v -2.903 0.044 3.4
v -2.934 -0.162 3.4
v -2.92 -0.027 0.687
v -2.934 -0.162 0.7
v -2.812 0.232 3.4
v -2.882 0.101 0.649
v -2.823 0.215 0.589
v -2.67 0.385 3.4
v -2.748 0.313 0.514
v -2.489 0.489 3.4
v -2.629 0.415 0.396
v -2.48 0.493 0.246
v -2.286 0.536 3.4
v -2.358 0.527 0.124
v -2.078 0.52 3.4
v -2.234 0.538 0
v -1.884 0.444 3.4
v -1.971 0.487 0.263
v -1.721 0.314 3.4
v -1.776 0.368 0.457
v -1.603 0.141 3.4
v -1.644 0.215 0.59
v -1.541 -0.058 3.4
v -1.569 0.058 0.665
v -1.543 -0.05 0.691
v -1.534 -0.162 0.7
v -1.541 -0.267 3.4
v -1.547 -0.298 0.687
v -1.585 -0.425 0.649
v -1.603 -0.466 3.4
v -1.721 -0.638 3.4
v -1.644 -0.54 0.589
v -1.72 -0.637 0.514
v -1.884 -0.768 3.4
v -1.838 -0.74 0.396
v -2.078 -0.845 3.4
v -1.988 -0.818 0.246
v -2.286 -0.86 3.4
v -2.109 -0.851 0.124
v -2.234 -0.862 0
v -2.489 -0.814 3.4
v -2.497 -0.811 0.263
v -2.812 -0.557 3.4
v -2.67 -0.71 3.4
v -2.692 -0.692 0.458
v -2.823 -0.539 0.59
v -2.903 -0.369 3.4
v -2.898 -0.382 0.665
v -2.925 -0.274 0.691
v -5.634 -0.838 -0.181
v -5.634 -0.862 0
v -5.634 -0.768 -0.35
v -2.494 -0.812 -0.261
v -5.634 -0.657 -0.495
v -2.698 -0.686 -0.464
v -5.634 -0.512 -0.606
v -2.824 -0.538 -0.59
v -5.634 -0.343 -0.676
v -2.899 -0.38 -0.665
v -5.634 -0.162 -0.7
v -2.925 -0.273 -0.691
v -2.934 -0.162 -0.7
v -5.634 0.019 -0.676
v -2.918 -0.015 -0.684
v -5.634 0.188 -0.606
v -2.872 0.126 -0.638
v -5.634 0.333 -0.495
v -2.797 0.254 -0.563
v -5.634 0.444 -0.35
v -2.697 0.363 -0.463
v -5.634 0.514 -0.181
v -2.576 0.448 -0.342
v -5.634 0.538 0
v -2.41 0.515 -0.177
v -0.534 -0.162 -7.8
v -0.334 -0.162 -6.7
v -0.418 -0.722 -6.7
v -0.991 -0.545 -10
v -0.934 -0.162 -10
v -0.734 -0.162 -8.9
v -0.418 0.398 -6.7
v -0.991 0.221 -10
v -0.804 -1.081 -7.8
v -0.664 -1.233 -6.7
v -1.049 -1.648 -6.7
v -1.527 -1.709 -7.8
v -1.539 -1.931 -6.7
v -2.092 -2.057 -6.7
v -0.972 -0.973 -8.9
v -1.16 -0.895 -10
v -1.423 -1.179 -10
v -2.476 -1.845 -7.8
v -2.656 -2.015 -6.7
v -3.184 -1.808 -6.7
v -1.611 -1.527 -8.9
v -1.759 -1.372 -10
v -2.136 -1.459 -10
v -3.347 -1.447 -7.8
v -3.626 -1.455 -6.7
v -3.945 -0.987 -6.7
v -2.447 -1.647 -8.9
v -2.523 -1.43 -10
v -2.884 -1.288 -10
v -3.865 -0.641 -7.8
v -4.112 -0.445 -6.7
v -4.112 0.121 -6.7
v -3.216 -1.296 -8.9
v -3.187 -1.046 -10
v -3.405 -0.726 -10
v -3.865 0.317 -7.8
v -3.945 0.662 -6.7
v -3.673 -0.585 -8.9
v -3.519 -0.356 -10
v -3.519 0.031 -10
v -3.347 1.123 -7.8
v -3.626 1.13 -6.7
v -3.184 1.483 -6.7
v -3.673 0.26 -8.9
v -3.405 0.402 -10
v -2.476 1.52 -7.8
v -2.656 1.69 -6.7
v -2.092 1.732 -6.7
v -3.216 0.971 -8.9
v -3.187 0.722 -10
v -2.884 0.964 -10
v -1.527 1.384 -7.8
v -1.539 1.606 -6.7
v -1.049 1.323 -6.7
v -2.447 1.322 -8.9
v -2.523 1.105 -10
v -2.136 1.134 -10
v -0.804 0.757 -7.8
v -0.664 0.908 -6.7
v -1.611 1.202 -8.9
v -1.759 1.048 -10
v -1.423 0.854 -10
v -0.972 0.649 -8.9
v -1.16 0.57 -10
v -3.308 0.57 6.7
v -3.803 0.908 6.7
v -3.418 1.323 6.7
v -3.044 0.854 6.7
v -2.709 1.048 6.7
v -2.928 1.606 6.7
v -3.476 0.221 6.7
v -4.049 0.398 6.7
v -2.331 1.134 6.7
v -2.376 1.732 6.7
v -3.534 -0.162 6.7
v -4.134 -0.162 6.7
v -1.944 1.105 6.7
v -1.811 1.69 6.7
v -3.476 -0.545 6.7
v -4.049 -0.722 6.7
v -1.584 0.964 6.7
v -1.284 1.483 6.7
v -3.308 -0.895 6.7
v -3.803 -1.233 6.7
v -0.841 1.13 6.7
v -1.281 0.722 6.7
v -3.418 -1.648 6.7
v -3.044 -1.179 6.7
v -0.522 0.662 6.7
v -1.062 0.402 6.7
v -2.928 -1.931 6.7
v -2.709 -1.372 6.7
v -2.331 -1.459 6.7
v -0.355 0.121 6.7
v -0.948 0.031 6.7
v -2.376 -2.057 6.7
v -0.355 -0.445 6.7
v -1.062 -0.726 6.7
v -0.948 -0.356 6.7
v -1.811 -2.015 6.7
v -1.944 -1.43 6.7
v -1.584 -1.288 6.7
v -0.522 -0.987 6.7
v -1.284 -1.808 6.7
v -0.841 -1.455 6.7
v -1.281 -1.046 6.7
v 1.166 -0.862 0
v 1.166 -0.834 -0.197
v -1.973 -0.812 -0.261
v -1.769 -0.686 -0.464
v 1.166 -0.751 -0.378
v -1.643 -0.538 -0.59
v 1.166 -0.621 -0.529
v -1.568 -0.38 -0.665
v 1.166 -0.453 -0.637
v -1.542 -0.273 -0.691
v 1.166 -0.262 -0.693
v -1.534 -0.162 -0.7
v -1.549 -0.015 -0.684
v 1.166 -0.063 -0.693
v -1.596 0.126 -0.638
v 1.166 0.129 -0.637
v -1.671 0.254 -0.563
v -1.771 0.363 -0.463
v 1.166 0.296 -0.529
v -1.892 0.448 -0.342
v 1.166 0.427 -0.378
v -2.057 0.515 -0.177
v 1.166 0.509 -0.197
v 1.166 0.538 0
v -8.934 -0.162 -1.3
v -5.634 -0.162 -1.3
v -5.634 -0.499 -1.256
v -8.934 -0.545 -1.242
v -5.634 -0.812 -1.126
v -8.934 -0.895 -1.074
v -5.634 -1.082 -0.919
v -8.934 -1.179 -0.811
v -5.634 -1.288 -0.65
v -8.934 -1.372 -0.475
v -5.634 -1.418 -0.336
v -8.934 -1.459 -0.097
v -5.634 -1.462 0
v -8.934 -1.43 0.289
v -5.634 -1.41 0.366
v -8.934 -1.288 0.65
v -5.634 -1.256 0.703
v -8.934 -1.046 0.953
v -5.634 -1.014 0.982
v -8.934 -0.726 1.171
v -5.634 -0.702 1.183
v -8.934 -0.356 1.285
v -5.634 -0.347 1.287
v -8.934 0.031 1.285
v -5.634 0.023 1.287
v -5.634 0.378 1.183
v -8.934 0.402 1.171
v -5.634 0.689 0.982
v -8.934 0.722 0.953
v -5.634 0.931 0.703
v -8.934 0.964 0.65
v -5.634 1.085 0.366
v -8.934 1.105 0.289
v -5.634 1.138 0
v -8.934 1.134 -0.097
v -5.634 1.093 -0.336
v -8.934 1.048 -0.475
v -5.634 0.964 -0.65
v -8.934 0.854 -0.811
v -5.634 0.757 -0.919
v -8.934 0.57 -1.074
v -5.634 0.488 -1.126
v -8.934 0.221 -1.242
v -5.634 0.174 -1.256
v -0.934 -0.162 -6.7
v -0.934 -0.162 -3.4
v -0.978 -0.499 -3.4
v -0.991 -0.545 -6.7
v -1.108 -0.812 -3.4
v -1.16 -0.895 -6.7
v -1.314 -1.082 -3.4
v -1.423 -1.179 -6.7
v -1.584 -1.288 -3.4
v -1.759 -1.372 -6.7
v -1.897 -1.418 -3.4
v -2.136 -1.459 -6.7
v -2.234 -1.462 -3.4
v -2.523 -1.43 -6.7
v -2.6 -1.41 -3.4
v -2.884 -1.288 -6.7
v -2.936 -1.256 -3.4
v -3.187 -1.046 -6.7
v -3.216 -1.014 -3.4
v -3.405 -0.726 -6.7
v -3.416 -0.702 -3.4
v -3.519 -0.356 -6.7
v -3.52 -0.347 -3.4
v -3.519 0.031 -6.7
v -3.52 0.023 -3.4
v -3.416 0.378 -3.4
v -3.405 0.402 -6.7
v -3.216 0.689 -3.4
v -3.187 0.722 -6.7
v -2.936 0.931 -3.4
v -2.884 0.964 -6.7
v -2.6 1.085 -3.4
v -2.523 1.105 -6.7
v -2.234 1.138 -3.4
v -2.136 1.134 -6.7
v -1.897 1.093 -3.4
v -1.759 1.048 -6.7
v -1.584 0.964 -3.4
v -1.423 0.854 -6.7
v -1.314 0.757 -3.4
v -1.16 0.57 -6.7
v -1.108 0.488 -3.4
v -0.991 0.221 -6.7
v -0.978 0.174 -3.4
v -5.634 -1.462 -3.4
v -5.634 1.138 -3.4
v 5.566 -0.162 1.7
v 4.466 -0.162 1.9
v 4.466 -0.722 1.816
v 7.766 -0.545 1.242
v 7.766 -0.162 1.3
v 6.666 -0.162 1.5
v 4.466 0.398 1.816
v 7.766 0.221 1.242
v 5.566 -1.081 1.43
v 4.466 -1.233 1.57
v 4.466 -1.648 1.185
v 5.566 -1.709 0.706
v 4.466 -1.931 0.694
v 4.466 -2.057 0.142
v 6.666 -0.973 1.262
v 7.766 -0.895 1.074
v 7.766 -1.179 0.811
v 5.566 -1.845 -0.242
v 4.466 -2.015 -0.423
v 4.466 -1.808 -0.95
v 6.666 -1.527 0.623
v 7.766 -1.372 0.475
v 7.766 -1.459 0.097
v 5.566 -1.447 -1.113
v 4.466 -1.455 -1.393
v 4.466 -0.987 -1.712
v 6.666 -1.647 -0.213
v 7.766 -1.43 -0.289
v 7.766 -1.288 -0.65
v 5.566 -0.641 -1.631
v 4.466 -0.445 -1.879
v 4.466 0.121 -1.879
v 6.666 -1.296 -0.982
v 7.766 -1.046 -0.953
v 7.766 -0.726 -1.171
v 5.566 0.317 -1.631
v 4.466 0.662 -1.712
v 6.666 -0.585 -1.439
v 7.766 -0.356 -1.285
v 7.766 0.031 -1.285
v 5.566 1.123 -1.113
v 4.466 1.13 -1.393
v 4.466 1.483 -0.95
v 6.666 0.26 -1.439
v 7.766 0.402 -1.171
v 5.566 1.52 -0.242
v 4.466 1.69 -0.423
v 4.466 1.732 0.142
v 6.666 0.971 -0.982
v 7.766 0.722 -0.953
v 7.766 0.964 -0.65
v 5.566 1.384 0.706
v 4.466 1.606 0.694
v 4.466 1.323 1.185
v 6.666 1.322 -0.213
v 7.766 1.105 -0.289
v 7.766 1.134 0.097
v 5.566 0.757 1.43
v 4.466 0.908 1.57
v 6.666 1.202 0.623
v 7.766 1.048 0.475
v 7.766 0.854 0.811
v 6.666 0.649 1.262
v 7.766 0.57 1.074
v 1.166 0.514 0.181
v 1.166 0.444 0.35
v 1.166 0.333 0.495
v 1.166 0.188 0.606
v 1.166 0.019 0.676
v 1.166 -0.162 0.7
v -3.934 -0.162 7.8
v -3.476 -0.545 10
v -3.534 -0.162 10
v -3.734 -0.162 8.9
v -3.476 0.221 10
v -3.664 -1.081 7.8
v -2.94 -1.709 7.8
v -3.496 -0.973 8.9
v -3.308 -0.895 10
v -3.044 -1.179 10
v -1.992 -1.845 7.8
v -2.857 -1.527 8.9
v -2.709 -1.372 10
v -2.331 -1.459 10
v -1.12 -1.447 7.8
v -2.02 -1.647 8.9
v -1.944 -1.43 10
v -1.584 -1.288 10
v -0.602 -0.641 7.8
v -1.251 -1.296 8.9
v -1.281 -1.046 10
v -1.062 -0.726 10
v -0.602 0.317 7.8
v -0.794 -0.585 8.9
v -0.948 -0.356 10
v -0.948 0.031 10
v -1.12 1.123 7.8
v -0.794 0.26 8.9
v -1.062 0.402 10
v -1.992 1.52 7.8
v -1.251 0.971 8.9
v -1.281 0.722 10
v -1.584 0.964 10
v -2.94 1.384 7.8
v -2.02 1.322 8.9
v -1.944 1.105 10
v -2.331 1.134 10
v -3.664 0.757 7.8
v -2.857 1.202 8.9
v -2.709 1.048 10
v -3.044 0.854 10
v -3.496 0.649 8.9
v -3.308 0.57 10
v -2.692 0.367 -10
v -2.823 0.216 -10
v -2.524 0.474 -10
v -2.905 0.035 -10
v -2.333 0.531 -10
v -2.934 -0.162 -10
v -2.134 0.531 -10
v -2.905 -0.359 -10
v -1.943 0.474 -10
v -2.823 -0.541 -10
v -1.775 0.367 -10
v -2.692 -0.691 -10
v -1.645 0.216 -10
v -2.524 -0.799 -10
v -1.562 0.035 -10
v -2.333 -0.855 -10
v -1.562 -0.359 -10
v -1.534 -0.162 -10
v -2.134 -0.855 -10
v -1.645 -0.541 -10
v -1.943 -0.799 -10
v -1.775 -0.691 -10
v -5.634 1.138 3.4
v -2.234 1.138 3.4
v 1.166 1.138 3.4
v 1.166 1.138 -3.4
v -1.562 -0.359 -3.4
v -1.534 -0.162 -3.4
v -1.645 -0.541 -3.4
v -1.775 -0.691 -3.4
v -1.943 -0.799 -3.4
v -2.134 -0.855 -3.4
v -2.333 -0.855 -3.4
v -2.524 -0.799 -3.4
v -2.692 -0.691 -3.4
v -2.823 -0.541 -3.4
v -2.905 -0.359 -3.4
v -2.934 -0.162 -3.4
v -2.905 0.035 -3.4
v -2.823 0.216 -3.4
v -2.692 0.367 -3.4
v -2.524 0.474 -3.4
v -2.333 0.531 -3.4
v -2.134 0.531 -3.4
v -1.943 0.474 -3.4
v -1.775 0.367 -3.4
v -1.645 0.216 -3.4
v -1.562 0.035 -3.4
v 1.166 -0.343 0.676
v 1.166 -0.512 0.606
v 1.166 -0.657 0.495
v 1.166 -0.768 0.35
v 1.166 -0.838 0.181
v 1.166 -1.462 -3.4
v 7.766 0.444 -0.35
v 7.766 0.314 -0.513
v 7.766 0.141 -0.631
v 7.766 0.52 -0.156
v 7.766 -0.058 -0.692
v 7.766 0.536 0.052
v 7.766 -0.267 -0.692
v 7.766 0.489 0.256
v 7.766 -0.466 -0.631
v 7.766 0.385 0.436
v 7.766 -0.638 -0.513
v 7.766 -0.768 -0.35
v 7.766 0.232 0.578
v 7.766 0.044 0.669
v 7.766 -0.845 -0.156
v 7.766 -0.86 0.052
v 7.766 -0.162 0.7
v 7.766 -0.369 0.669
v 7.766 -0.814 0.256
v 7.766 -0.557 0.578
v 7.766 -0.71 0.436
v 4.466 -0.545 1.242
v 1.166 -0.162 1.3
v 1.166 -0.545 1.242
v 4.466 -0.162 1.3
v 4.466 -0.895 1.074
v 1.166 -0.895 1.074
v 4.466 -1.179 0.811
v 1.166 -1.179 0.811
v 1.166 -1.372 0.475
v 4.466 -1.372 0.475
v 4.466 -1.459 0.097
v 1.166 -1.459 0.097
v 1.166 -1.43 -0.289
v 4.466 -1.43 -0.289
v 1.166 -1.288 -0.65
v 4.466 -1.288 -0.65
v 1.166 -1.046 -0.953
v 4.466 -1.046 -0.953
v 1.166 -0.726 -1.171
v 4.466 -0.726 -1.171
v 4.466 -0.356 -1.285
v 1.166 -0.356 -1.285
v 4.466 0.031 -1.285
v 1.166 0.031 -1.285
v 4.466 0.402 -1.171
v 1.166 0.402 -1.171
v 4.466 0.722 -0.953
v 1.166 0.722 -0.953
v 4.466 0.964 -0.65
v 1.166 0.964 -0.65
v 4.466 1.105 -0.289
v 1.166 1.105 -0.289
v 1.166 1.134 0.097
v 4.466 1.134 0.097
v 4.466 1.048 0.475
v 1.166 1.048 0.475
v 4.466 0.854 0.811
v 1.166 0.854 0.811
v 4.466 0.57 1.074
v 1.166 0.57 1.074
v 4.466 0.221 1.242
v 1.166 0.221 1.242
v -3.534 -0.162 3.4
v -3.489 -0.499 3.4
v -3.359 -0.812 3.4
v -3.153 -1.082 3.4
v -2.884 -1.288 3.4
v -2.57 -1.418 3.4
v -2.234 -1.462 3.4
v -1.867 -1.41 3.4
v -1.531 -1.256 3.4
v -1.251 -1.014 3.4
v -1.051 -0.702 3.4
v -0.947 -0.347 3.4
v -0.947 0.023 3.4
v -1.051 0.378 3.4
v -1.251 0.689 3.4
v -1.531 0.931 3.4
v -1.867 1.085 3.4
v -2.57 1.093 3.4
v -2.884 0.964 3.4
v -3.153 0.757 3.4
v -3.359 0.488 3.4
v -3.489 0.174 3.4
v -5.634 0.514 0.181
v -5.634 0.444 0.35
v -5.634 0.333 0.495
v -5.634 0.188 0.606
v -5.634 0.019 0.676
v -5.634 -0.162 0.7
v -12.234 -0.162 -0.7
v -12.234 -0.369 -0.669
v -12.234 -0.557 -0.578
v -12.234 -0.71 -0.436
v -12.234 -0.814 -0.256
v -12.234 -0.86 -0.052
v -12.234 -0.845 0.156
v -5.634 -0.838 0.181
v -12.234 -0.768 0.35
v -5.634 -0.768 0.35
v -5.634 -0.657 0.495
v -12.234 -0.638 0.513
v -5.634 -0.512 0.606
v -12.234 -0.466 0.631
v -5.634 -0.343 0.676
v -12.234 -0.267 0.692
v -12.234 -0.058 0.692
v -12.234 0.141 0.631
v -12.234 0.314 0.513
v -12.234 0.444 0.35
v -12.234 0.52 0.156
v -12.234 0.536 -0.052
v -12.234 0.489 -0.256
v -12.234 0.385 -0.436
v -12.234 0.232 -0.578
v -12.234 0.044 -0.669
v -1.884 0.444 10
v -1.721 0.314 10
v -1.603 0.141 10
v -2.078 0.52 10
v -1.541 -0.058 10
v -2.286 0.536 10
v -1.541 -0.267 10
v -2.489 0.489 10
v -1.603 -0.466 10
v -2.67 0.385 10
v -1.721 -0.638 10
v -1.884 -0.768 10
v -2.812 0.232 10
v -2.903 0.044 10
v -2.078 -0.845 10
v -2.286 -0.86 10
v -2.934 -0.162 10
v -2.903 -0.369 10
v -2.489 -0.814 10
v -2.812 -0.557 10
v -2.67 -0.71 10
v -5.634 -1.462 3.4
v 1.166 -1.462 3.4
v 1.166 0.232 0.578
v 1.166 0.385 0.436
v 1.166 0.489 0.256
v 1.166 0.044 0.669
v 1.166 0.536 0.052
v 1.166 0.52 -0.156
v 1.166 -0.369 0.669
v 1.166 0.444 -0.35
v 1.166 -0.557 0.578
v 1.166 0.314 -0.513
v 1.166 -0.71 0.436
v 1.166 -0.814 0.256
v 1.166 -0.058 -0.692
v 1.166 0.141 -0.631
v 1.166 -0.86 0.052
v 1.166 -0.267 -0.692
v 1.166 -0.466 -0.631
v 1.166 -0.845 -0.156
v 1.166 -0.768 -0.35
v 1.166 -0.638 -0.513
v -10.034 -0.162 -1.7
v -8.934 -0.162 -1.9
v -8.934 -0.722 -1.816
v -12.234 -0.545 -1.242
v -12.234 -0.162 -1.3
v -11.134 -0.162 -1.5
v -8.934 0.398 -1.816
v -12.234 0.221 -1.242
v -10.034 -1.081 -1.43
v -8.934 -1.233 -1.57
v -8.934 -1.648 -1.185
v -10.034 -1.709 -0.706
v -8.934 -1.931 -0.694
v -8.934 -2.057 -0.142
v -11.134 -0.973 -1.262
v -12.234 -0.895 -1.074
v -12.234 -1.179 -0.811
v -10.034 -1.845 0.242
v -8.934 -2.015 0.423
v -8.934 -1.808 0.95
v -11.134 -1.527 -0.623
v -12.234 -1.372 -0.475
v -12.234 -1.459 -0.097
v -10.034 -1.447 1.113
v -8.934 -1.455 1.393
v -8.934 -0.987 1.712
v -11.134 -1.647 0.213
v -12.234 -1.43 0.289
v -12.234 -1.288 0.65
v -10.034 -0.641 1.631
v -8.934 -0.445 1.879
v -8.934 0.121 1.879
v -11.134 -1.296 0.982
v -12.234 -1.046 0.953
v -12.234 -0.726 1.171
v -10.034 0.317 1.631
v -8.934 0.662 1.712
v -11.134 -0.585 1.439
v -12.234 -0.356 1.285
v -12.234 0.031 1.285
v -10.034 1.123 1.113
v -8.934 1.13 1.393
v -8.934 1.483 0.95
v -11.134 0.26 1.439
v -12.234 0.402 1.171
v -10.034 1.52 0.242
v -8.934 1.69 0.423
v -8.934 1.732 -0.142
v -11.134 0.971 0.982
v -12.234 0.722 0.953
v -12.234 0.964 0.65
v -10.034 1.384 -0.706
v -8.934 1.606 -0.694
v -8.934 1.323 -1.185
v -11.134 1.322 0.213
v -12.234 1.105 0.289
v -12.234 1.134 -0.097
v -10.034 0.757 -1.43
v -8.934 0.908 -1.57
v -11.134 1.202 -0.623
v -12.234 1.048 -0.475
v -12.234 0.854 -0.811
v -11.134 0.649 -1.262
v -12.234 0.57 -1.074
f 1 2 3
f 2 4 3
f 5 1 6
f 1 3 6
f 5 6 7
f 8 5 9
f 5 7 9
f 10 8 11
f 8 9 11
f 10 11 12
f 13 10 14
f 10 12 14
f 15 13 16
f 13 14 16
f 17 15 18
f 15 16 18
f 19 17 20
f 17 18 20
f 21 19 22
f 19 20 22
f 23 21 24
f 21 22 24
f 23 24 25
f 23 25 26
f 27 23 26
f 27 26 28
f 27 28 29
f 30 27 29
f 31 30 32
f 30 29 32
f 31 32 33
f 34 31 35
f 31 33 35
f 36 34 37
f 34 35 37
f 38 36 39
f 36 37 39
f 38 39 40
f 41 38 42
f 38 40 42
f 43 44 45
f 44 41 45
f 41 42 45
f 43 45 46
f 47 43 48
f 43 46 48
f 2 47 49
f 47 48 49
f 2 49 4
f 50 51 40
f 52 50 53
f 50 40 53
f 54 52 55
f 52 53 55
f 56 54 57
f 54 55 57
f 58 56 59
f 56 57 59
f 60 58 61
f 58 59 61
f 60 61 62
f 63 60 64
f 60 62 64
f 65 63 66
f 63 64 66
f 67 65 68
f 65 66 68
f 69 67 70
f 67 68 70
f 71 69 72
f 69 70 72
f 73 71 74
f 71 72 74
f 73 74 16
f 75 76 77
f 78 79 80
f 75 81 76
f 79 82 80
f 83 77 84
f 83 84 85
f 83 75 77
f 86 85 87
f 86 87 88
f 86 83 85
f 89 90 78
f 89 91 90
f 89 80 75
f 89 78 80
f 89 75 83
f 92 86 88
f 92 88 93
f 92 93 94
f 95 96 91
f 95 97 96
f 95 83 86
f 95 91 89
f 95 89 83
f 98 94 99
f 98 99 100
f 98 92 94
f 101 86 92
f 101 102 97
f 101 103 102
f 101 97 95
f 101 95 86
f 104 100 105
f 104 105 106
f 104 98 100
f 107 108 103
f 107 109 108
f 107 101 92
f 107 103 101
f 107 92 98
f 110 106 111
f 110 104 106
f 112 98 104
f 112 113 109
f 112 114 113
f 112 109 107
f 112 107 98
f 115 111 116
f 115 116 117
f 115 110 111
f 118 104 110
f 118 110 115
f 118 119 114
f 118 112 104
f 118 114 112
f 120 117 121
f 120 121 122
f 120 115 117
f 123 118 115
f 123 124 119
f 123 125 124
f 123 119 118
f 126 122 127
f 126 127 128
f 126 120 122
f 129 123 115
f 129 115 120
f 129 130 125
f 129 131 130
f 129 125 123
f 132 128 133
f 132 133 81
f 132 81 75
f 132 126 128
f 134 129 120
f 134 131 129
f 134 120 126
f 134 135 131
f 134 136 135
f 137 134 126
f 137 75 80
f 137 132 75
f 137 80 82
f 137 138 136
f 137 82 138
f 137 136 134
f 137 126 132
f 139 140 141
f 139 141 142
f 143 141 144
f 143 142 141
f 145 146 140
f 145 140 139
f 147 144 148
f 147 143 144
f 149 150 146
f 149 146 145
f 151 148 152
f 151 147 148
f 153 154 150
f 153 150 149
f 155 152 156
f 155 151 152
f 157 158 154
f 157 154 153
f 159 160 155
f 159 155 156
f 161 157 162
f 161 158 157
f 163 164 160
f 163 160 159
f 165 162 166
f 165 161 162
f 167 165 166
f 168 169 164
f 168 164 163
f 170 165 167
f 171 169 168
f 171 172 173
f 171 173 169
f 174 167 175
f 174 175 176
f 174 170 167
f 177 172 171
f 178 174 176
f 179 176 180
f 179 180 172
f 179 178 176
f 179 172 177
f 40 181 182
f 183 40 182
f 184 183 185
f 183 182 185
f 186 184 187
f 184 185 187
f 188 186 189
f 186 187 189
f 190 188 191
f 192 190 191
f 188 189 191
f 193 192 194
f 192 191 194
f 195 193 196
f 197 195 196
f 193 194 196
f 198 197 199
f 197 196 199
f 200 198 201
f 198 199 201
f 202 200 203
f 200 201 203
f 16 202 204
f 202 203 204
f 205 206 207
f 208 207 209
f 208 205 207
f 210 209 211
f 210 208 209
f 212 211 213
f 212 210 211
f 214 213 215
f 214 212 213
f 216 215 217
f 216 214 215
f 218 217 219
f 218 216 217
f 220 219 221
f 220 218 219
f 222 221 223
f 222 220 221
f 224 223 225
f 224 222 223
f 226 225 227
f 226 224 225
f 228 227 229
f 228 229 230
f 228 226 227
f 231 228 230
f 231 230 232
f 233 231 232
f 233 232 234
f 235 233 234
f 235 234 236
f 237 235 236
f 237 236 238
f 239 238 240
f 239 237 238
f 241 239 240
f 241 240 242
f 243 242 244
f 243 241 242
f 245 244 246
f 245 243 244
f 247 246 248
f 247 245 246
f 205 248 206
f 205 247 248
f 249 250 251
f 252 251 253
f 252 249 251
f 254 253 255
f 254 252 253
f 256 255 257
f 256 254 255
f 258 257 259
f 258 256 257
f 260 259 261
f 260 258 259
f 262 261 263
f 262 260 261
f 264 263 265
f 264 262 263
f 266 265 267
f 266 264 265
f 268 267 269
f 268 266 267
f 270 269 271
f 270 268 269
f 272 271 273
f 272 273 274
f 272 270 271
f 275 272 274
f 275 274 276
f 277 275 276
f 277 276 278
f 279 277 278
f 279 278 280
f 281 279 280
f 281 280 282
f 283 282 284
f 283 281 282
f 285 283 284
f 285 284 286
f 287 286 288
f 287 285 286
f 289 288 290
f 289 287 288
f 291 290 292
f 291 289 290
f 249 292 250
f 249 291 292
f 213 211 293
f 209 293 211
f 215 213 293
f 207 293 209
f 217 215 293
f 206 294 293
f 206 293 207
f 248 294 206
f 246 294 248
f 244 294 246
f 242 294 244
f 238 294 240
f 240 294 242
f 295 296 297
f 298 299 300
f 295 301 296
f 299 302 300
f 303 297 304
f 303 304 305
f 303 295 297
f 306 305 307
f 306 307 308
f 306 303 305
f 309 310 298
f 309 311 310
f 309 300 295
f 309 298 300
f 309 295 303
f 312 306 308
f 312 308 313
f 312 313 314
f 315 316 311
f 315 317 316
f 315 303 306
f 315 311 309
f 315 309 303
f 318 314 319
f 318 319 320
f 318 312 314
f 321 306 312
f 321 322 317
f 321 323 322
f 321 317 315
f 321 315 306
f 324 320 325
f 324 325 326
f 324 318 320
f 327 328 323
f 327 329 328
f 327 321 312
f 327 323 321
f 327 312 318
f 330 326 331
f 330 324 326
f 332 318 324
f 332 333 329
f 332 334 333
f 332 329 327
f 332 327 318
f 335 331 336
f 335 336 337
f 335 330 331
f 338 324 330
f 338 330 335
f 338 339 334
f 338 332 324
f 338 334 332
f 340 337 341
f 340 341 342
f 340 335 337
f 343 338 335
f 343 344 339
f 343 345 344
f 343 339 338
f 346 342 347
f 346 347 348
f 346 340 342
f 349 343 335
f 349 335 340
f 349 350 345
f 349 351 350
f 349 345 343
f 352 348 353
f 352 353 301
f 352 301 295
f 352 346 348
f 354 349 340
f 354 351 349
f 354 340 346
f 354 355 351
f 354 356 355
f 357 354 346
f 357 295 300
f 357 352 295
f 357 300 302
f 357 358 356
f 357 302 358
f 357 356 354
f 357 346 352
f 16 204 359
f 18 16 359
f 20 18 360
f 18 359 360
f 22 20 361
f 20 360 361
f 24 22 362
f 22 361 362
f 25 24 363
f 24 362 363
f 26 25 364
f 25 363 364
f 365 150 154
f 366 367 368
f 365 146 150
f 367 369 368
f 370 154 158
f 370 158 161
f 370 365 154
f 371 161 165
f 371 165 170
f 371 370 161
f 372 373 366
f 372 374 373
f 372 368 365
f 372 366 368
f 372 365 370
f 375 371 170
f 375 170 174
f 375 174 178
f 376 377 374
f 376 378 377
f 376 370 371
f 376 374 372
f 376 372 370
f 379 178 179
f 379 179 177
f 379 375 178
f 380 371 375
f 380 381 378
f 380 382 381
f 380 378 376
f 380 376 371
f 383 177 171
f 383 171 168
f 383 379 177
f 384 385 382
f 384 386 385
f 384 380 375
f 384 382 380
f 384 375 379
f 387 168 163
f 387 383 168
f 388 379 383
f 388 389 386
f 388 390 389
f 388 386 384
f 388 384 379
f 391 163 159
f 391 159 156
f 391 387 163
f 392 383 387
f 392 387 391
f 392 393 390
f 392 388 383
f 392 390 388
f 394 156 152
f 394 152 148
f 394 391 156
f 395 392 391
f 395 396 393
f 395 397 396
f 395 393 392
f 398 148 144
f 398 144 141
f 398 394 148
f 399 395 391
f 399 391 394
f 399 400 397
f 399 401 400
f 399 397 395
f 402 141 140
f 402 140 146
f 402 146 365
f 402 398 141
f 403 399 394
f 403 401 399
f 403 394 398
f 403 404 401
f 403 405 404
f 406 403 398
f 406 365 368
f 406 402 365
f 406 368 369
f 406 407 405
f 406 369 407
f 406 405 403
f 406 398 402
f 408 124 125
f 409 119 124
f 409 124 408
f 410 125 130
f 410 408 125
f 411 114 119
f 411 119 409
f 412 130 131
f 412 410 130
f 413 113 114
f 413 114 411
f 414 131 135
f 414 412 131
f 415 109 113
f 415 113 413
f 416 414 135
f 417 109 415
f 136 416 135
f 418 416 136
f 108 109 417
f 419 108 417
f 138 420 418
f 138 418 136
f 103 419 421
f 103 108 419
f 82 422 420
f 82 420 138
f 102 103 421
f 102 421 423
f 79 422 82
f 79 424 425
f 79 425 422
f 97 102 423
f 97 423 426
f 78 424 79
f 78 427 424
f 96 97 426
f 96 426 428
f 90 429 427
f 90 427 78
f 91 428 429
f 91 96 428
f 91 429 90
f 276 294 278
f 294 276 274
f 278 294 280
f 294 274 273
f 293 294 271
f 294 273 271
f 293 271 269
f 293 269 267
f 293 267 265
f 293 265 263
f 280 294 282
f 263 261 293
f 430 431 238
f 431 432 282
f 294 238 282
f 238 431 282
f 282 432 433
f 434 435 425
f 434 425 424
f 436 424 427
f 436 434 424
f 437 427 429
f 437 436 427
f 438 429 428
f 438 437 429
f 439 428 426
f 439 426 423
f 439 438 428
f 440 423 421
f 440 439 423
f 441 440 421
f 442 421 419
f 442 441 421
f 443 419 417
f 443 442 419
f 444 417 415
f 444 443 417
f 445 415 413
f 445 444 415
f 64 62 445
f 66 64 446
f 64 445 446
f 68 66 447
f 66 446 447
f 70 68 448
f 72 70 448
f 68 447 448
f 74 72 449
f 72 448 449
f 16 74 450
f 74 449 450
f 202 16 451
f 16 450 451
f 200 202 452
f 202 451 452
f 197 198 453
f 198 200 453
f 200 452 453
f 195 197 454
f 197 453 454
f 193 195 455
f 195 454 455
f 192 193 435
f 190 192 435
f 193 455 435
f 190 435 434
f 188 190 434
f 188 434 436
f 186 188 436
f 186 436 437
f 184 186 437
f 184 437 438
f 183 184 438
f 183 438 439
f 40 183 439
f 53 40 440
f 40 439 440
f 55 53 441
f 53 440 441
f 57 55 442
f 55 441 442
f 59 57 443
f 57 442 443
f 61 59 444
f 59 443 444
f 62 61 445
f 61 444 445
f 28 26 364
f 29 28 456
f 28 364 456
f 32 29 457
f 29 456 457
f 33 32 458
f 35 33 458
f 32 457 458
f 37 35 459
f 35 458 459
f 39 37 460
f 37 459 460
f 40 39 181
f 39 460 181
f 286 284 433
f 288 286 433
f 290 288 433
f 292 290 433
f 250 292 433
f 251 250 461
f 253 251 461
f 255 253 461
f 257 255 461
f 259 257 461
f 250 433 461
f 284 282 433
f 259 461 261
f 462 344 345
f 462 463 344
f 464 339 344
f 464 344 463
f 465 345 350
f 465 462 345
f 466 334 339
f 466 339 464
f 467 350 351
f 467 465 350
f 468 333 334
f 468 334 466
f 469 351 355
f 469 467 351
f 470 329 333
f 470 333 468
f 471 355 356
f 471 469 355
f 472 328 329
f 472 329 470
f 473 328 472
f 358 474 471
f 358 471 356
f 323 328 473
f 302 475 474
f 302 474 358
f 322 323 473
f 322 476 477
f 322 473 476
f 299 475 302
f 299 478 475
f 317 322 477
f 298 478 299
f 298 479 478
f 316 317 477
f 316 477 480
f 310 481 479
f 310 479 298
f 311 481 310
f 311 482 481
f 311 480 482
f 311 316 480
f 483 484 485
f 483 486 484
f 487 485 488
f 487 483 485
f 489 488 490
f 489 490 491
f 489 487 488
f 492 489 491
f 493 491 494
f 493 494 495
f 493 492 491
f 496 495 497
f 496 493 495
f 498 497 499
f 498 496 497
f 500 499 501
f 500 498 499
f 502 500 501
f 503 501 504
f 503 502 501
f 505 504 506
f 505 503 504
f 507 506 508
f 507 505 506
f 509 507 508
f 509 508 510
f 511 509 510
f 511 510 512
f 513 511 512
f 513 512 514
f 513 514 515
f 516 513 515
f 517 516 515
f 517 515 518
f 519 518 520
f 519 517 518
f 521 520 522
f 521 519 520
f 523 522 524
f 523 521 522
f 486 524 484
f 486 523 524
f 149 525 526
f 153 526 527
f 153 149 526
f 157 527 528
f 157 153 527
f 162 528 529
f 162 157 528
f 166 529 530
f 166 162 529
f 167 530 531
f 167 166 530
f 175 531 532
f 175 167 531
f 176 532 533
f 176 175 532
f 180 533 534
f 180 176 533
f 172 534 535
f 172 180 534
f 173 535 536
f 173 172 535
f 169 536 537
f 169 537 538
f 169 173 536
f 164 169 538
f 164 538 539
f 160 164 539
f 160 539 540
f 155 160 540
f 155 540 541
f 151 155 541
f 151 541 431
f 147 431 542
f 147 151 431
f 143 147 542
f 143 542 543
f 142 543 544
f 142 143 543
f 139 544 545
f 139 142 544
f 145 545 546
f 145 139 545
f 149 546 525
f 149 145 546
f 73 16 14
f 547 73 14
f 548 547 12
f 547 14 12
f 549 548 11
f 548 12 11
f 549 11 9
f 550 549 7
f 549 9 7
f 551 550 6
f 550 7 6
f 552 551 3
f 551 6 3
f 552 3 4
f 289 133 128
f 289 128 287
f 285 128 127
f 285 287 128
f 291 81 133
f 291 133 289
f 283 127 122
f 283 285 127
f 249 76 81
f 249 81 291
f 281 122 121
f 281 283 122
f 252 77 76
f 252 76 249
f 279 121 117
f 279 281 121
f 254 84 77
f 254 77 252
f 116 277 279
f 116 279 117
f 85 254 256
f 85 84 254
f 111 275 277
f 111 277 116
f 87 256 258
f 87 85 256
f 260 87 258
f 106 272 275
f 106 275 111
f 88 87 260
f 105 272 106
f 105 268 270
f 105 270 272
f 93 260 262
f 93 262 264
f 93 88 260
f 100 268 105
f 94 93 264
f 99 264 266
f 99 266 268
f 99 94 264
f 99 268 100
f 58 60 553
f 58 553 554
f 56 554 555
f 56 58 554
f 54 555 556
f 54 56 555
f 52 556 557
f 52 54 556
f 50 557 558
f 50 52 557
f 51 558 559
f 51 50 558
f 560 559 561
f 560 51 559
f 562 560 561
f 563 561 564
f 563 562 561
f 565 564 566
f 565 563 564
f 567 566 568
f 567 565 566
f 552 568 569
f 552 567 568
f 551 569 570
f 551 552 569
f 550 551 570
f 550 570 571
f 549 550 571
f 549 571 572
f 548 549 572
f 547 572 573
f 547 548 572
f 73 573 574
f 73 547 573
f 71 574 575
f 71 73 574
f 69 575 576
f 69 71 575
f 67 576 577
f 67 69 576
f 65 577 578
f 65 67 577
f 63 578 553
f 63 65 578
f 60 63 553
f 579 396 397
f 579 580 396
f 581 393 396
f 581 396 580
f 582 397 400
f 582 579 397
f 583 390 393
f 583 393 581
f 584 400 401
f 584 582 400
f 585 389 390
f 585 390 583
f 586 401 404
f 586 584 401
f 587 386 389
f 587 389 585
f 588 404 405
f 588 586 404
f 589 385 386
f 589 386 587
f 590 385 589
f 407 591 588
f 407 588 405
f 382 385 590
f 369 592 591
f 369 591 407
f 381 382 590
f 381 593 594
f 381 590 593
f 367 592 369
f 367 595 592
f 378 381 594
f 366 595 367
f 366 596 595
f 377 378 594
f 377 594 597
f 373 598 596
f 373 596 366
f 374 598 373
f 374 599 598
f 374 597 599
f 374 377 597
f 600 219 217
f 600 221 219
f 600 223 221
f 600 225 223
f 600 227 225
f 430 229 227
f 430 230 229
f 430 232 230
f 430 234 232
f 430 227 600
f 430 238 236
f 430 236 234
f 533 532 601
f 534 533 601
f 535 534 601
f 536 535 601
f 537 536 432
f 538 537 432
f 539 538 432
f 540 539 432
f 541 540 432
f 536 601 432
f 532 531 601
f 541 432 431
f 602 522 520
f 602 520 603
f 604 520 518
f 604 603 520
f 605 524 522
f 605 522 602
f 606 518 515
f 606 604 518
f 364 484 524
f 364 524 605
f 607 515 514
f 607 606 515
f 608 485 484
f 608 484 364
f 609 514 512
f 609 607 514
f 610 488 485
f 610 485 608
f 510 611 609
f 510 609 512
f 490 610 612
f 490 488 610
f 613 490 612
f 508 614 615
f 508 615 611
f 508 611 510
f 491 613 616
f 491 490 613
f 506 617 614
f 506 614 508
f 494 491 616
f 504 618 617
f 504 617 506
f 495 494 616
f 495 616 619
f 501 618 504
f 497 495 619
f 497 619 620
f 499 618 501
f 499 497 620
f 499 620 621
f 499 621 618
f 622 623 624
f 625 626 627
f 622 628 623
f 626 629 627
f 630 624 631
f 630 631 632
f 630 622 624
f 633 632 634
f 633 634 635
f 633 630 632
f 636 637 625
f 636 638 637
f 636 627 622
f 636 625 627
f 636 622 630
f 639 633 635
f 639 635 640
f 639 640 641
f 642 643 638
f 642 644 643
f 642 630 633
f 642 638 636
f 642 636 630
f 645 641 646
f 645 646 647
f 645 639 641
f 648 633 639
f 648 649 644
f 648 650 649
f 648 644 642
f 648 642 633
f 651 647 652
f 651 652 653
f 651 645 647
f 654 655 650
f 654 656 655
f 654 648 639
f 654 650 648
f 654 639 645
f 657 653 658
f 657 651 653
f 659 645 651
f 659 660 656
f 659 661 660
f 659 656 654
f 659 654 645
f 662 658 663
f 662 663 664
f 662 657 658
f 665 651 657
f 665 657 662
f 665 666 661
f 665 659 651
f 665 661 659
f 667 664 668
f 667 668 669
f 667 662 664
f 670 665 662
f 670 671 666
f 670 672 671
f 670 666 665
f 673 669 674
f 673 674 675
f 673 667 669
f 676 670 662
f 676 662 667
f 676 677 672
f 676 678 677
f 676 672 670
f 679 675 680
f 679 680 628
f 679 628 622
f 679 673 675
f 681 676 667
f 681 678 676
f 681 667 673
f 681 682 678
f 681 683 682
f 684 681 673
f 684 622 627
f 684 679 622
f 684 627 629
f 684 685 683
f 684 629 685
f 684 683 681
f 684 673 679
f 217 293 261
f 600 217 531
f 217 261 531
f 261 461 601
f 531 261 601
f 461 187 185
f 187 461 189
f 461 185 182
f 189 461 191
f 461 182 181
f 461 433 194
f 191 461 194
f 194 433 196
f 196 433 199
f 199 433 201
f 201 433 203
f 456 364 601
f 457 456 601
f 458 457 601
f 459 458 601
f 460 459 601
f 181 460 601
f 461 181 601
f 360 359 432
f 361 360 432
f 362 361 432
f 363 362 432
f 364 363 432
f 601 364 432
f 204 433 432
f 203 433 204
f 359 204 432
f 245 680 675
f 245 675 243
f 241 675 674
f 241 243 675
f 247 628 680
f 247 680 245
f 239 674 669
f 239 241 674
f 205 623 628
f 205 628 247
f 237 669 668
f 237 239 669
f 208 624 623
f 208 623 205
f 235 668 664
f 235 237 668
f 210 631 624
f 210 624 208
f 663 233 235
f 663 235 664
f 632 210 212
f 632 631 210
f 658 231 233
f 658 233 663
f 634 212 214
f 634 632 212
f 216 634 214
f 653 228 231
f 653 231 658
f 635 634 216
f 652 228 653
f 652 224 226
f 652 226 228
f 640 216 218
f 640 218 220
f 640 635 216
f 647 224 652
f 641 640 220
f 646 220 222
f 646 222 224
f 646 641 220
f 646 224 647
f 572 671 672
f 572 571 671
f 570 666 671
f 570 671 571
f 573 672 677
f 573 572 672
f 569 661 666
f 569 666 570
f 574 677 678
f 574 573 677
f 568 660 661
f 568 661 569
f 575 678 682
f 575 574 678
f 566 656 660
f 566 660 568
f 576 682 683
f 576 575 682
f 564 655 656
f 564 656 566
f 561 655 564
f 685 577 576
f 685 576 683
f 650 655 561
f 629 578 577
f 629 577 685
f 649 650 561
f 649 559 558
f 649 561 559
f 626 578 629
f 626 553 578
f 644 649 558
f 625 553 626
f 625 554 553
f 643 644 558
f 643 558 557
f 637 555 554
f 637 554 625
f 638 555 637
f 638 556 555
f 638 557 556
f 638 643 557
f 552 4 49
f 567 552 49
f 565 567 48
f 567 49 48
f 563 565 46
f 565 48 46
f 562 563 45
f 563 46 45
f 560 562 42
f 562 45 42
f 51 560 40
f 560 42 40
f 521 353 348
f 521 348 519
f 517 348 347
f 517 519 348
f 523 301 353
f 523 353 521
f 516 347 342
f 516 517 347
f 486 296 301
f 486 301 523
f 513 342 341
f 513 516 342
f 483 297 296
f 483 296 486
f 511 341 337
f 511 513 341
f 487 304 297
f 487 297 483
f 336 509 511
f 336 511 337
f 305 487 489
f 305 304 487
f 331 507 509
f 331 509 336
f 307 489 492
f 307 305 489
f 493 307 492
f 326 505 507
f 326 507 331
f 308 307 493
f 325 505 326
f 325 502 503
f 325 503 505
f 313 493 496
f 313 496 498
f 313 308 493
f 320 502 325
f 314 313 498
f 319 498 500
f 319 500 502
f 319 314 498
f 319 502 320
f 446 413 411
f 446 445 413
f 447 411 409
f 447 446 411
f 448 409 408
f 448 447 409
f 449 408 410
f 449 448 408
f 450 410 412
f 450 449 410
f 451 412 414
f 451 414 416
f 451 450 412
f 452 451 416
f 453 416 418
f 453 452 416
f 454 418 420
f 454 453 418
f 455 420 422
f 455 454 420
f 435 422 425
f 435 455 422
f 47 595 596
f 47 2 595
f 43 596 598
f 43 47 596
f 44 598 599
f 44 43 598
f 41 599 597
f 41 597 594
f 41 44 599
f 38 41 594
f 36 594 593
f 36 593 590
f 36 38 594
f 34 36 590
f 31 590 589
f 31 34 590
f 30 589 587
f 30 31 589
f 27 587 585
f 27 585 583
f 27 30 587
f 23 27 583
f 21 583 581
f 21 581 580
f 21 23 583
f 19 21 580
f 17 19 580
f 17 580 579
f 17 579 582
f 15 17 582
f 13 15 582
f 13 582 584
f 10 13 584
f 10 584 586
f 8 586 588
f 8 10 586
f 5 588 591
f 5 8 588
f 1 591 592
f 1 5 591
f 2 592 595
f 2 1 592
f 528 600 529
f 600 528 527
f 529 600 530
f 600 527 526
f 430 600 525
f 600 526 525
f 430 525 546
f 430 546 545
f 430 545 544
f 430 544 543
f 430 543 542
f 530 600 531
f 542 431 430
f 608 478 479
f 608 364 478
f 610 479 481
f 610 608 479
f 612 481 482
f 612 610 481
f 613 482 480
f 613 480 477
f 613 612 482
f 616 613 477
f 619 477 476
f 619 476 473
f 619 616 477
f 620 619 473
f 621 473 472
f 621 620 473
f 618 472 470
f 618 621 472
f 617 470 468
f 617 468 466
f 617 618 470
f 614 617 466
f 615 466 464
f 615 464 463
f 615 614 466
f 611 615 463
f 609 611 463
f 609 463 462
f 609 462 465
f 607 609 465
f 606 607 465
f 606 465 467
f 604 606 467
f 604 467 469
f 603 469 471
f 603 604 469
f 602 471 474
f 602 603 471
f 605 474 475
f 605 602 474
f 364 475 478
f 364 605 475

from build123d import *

# Parameters (mm, degrees)
SKETCH2_W           = 6.8
SKETCH2_H           = 2.6
SKETCH2_R           = 0.7
BOSS_EXTRUDE1_DEPTH = 6.8
CIRPATTERN2_COUNT   = 4
SKETCH3_R           = 0.7
CUT_EXTRUDE1_DEPTH  = 24.535395206


with BuildPart() as part:
    # Sketch1 → Revolve2 (revolve)
    with BuildSketch(Plane.XY):
        Polygon((7.766363636, 0.537727273), (7.766363636, 1.137727273), (4.466363636, 1.737727273), (4.466363636, 1.137727273), (1.166363636, 1.137727273), (1.166363636, 0.537727273), align=None)
    revolve2 = revolve(axis=Axis((-4.790909091, -0.162272727, 0), (1, 0, 0)))


with BuildPart() as body_2:
    # Sketch2 → Boss-Extrude1 (new body)
    with BuildSketch(Plane.ZY.offset(-1.166363636)):
        with Locations((0, -0.162272727)):
            Rectangle(SKETCH2_W, SKETCH2_H)
        with Locations((0, -0.162272727)):
            Circle(SKETCH2_R, mode=Mode.SUBTRACT)
    extrude(amount=BOSS_EXTRUDE1_DEPTH)

    # CirPattern2: Revolve2 ×4 about axis
    cirpattern2_axis = Axis((-2.233636364, 1.267727273, 0), (0, -1, 0))
    for i in range(1, CIRPATTERN2_COUNT):
        add(revolve2.rotate(cirpattern2_axis, i * 360 / CIRPATTERN2_COUNT))

    # Sketch3 → Cut-Extrude1 (cut, through all)
    with BuildSketch(Plane(origin=(0, 0, -10), x_dir=(-1, 0, 0), z_dir=(0, 0, -1))):
        with Locations((2.233636364, -0.162272727)):
            Circle(SKETCH3_R)
    extrude(amount=-CUT_EXTRUDE1_DEPTH, mode=Mode.SUBTRACT)


solid = Compound([part.part, body_2.part])
